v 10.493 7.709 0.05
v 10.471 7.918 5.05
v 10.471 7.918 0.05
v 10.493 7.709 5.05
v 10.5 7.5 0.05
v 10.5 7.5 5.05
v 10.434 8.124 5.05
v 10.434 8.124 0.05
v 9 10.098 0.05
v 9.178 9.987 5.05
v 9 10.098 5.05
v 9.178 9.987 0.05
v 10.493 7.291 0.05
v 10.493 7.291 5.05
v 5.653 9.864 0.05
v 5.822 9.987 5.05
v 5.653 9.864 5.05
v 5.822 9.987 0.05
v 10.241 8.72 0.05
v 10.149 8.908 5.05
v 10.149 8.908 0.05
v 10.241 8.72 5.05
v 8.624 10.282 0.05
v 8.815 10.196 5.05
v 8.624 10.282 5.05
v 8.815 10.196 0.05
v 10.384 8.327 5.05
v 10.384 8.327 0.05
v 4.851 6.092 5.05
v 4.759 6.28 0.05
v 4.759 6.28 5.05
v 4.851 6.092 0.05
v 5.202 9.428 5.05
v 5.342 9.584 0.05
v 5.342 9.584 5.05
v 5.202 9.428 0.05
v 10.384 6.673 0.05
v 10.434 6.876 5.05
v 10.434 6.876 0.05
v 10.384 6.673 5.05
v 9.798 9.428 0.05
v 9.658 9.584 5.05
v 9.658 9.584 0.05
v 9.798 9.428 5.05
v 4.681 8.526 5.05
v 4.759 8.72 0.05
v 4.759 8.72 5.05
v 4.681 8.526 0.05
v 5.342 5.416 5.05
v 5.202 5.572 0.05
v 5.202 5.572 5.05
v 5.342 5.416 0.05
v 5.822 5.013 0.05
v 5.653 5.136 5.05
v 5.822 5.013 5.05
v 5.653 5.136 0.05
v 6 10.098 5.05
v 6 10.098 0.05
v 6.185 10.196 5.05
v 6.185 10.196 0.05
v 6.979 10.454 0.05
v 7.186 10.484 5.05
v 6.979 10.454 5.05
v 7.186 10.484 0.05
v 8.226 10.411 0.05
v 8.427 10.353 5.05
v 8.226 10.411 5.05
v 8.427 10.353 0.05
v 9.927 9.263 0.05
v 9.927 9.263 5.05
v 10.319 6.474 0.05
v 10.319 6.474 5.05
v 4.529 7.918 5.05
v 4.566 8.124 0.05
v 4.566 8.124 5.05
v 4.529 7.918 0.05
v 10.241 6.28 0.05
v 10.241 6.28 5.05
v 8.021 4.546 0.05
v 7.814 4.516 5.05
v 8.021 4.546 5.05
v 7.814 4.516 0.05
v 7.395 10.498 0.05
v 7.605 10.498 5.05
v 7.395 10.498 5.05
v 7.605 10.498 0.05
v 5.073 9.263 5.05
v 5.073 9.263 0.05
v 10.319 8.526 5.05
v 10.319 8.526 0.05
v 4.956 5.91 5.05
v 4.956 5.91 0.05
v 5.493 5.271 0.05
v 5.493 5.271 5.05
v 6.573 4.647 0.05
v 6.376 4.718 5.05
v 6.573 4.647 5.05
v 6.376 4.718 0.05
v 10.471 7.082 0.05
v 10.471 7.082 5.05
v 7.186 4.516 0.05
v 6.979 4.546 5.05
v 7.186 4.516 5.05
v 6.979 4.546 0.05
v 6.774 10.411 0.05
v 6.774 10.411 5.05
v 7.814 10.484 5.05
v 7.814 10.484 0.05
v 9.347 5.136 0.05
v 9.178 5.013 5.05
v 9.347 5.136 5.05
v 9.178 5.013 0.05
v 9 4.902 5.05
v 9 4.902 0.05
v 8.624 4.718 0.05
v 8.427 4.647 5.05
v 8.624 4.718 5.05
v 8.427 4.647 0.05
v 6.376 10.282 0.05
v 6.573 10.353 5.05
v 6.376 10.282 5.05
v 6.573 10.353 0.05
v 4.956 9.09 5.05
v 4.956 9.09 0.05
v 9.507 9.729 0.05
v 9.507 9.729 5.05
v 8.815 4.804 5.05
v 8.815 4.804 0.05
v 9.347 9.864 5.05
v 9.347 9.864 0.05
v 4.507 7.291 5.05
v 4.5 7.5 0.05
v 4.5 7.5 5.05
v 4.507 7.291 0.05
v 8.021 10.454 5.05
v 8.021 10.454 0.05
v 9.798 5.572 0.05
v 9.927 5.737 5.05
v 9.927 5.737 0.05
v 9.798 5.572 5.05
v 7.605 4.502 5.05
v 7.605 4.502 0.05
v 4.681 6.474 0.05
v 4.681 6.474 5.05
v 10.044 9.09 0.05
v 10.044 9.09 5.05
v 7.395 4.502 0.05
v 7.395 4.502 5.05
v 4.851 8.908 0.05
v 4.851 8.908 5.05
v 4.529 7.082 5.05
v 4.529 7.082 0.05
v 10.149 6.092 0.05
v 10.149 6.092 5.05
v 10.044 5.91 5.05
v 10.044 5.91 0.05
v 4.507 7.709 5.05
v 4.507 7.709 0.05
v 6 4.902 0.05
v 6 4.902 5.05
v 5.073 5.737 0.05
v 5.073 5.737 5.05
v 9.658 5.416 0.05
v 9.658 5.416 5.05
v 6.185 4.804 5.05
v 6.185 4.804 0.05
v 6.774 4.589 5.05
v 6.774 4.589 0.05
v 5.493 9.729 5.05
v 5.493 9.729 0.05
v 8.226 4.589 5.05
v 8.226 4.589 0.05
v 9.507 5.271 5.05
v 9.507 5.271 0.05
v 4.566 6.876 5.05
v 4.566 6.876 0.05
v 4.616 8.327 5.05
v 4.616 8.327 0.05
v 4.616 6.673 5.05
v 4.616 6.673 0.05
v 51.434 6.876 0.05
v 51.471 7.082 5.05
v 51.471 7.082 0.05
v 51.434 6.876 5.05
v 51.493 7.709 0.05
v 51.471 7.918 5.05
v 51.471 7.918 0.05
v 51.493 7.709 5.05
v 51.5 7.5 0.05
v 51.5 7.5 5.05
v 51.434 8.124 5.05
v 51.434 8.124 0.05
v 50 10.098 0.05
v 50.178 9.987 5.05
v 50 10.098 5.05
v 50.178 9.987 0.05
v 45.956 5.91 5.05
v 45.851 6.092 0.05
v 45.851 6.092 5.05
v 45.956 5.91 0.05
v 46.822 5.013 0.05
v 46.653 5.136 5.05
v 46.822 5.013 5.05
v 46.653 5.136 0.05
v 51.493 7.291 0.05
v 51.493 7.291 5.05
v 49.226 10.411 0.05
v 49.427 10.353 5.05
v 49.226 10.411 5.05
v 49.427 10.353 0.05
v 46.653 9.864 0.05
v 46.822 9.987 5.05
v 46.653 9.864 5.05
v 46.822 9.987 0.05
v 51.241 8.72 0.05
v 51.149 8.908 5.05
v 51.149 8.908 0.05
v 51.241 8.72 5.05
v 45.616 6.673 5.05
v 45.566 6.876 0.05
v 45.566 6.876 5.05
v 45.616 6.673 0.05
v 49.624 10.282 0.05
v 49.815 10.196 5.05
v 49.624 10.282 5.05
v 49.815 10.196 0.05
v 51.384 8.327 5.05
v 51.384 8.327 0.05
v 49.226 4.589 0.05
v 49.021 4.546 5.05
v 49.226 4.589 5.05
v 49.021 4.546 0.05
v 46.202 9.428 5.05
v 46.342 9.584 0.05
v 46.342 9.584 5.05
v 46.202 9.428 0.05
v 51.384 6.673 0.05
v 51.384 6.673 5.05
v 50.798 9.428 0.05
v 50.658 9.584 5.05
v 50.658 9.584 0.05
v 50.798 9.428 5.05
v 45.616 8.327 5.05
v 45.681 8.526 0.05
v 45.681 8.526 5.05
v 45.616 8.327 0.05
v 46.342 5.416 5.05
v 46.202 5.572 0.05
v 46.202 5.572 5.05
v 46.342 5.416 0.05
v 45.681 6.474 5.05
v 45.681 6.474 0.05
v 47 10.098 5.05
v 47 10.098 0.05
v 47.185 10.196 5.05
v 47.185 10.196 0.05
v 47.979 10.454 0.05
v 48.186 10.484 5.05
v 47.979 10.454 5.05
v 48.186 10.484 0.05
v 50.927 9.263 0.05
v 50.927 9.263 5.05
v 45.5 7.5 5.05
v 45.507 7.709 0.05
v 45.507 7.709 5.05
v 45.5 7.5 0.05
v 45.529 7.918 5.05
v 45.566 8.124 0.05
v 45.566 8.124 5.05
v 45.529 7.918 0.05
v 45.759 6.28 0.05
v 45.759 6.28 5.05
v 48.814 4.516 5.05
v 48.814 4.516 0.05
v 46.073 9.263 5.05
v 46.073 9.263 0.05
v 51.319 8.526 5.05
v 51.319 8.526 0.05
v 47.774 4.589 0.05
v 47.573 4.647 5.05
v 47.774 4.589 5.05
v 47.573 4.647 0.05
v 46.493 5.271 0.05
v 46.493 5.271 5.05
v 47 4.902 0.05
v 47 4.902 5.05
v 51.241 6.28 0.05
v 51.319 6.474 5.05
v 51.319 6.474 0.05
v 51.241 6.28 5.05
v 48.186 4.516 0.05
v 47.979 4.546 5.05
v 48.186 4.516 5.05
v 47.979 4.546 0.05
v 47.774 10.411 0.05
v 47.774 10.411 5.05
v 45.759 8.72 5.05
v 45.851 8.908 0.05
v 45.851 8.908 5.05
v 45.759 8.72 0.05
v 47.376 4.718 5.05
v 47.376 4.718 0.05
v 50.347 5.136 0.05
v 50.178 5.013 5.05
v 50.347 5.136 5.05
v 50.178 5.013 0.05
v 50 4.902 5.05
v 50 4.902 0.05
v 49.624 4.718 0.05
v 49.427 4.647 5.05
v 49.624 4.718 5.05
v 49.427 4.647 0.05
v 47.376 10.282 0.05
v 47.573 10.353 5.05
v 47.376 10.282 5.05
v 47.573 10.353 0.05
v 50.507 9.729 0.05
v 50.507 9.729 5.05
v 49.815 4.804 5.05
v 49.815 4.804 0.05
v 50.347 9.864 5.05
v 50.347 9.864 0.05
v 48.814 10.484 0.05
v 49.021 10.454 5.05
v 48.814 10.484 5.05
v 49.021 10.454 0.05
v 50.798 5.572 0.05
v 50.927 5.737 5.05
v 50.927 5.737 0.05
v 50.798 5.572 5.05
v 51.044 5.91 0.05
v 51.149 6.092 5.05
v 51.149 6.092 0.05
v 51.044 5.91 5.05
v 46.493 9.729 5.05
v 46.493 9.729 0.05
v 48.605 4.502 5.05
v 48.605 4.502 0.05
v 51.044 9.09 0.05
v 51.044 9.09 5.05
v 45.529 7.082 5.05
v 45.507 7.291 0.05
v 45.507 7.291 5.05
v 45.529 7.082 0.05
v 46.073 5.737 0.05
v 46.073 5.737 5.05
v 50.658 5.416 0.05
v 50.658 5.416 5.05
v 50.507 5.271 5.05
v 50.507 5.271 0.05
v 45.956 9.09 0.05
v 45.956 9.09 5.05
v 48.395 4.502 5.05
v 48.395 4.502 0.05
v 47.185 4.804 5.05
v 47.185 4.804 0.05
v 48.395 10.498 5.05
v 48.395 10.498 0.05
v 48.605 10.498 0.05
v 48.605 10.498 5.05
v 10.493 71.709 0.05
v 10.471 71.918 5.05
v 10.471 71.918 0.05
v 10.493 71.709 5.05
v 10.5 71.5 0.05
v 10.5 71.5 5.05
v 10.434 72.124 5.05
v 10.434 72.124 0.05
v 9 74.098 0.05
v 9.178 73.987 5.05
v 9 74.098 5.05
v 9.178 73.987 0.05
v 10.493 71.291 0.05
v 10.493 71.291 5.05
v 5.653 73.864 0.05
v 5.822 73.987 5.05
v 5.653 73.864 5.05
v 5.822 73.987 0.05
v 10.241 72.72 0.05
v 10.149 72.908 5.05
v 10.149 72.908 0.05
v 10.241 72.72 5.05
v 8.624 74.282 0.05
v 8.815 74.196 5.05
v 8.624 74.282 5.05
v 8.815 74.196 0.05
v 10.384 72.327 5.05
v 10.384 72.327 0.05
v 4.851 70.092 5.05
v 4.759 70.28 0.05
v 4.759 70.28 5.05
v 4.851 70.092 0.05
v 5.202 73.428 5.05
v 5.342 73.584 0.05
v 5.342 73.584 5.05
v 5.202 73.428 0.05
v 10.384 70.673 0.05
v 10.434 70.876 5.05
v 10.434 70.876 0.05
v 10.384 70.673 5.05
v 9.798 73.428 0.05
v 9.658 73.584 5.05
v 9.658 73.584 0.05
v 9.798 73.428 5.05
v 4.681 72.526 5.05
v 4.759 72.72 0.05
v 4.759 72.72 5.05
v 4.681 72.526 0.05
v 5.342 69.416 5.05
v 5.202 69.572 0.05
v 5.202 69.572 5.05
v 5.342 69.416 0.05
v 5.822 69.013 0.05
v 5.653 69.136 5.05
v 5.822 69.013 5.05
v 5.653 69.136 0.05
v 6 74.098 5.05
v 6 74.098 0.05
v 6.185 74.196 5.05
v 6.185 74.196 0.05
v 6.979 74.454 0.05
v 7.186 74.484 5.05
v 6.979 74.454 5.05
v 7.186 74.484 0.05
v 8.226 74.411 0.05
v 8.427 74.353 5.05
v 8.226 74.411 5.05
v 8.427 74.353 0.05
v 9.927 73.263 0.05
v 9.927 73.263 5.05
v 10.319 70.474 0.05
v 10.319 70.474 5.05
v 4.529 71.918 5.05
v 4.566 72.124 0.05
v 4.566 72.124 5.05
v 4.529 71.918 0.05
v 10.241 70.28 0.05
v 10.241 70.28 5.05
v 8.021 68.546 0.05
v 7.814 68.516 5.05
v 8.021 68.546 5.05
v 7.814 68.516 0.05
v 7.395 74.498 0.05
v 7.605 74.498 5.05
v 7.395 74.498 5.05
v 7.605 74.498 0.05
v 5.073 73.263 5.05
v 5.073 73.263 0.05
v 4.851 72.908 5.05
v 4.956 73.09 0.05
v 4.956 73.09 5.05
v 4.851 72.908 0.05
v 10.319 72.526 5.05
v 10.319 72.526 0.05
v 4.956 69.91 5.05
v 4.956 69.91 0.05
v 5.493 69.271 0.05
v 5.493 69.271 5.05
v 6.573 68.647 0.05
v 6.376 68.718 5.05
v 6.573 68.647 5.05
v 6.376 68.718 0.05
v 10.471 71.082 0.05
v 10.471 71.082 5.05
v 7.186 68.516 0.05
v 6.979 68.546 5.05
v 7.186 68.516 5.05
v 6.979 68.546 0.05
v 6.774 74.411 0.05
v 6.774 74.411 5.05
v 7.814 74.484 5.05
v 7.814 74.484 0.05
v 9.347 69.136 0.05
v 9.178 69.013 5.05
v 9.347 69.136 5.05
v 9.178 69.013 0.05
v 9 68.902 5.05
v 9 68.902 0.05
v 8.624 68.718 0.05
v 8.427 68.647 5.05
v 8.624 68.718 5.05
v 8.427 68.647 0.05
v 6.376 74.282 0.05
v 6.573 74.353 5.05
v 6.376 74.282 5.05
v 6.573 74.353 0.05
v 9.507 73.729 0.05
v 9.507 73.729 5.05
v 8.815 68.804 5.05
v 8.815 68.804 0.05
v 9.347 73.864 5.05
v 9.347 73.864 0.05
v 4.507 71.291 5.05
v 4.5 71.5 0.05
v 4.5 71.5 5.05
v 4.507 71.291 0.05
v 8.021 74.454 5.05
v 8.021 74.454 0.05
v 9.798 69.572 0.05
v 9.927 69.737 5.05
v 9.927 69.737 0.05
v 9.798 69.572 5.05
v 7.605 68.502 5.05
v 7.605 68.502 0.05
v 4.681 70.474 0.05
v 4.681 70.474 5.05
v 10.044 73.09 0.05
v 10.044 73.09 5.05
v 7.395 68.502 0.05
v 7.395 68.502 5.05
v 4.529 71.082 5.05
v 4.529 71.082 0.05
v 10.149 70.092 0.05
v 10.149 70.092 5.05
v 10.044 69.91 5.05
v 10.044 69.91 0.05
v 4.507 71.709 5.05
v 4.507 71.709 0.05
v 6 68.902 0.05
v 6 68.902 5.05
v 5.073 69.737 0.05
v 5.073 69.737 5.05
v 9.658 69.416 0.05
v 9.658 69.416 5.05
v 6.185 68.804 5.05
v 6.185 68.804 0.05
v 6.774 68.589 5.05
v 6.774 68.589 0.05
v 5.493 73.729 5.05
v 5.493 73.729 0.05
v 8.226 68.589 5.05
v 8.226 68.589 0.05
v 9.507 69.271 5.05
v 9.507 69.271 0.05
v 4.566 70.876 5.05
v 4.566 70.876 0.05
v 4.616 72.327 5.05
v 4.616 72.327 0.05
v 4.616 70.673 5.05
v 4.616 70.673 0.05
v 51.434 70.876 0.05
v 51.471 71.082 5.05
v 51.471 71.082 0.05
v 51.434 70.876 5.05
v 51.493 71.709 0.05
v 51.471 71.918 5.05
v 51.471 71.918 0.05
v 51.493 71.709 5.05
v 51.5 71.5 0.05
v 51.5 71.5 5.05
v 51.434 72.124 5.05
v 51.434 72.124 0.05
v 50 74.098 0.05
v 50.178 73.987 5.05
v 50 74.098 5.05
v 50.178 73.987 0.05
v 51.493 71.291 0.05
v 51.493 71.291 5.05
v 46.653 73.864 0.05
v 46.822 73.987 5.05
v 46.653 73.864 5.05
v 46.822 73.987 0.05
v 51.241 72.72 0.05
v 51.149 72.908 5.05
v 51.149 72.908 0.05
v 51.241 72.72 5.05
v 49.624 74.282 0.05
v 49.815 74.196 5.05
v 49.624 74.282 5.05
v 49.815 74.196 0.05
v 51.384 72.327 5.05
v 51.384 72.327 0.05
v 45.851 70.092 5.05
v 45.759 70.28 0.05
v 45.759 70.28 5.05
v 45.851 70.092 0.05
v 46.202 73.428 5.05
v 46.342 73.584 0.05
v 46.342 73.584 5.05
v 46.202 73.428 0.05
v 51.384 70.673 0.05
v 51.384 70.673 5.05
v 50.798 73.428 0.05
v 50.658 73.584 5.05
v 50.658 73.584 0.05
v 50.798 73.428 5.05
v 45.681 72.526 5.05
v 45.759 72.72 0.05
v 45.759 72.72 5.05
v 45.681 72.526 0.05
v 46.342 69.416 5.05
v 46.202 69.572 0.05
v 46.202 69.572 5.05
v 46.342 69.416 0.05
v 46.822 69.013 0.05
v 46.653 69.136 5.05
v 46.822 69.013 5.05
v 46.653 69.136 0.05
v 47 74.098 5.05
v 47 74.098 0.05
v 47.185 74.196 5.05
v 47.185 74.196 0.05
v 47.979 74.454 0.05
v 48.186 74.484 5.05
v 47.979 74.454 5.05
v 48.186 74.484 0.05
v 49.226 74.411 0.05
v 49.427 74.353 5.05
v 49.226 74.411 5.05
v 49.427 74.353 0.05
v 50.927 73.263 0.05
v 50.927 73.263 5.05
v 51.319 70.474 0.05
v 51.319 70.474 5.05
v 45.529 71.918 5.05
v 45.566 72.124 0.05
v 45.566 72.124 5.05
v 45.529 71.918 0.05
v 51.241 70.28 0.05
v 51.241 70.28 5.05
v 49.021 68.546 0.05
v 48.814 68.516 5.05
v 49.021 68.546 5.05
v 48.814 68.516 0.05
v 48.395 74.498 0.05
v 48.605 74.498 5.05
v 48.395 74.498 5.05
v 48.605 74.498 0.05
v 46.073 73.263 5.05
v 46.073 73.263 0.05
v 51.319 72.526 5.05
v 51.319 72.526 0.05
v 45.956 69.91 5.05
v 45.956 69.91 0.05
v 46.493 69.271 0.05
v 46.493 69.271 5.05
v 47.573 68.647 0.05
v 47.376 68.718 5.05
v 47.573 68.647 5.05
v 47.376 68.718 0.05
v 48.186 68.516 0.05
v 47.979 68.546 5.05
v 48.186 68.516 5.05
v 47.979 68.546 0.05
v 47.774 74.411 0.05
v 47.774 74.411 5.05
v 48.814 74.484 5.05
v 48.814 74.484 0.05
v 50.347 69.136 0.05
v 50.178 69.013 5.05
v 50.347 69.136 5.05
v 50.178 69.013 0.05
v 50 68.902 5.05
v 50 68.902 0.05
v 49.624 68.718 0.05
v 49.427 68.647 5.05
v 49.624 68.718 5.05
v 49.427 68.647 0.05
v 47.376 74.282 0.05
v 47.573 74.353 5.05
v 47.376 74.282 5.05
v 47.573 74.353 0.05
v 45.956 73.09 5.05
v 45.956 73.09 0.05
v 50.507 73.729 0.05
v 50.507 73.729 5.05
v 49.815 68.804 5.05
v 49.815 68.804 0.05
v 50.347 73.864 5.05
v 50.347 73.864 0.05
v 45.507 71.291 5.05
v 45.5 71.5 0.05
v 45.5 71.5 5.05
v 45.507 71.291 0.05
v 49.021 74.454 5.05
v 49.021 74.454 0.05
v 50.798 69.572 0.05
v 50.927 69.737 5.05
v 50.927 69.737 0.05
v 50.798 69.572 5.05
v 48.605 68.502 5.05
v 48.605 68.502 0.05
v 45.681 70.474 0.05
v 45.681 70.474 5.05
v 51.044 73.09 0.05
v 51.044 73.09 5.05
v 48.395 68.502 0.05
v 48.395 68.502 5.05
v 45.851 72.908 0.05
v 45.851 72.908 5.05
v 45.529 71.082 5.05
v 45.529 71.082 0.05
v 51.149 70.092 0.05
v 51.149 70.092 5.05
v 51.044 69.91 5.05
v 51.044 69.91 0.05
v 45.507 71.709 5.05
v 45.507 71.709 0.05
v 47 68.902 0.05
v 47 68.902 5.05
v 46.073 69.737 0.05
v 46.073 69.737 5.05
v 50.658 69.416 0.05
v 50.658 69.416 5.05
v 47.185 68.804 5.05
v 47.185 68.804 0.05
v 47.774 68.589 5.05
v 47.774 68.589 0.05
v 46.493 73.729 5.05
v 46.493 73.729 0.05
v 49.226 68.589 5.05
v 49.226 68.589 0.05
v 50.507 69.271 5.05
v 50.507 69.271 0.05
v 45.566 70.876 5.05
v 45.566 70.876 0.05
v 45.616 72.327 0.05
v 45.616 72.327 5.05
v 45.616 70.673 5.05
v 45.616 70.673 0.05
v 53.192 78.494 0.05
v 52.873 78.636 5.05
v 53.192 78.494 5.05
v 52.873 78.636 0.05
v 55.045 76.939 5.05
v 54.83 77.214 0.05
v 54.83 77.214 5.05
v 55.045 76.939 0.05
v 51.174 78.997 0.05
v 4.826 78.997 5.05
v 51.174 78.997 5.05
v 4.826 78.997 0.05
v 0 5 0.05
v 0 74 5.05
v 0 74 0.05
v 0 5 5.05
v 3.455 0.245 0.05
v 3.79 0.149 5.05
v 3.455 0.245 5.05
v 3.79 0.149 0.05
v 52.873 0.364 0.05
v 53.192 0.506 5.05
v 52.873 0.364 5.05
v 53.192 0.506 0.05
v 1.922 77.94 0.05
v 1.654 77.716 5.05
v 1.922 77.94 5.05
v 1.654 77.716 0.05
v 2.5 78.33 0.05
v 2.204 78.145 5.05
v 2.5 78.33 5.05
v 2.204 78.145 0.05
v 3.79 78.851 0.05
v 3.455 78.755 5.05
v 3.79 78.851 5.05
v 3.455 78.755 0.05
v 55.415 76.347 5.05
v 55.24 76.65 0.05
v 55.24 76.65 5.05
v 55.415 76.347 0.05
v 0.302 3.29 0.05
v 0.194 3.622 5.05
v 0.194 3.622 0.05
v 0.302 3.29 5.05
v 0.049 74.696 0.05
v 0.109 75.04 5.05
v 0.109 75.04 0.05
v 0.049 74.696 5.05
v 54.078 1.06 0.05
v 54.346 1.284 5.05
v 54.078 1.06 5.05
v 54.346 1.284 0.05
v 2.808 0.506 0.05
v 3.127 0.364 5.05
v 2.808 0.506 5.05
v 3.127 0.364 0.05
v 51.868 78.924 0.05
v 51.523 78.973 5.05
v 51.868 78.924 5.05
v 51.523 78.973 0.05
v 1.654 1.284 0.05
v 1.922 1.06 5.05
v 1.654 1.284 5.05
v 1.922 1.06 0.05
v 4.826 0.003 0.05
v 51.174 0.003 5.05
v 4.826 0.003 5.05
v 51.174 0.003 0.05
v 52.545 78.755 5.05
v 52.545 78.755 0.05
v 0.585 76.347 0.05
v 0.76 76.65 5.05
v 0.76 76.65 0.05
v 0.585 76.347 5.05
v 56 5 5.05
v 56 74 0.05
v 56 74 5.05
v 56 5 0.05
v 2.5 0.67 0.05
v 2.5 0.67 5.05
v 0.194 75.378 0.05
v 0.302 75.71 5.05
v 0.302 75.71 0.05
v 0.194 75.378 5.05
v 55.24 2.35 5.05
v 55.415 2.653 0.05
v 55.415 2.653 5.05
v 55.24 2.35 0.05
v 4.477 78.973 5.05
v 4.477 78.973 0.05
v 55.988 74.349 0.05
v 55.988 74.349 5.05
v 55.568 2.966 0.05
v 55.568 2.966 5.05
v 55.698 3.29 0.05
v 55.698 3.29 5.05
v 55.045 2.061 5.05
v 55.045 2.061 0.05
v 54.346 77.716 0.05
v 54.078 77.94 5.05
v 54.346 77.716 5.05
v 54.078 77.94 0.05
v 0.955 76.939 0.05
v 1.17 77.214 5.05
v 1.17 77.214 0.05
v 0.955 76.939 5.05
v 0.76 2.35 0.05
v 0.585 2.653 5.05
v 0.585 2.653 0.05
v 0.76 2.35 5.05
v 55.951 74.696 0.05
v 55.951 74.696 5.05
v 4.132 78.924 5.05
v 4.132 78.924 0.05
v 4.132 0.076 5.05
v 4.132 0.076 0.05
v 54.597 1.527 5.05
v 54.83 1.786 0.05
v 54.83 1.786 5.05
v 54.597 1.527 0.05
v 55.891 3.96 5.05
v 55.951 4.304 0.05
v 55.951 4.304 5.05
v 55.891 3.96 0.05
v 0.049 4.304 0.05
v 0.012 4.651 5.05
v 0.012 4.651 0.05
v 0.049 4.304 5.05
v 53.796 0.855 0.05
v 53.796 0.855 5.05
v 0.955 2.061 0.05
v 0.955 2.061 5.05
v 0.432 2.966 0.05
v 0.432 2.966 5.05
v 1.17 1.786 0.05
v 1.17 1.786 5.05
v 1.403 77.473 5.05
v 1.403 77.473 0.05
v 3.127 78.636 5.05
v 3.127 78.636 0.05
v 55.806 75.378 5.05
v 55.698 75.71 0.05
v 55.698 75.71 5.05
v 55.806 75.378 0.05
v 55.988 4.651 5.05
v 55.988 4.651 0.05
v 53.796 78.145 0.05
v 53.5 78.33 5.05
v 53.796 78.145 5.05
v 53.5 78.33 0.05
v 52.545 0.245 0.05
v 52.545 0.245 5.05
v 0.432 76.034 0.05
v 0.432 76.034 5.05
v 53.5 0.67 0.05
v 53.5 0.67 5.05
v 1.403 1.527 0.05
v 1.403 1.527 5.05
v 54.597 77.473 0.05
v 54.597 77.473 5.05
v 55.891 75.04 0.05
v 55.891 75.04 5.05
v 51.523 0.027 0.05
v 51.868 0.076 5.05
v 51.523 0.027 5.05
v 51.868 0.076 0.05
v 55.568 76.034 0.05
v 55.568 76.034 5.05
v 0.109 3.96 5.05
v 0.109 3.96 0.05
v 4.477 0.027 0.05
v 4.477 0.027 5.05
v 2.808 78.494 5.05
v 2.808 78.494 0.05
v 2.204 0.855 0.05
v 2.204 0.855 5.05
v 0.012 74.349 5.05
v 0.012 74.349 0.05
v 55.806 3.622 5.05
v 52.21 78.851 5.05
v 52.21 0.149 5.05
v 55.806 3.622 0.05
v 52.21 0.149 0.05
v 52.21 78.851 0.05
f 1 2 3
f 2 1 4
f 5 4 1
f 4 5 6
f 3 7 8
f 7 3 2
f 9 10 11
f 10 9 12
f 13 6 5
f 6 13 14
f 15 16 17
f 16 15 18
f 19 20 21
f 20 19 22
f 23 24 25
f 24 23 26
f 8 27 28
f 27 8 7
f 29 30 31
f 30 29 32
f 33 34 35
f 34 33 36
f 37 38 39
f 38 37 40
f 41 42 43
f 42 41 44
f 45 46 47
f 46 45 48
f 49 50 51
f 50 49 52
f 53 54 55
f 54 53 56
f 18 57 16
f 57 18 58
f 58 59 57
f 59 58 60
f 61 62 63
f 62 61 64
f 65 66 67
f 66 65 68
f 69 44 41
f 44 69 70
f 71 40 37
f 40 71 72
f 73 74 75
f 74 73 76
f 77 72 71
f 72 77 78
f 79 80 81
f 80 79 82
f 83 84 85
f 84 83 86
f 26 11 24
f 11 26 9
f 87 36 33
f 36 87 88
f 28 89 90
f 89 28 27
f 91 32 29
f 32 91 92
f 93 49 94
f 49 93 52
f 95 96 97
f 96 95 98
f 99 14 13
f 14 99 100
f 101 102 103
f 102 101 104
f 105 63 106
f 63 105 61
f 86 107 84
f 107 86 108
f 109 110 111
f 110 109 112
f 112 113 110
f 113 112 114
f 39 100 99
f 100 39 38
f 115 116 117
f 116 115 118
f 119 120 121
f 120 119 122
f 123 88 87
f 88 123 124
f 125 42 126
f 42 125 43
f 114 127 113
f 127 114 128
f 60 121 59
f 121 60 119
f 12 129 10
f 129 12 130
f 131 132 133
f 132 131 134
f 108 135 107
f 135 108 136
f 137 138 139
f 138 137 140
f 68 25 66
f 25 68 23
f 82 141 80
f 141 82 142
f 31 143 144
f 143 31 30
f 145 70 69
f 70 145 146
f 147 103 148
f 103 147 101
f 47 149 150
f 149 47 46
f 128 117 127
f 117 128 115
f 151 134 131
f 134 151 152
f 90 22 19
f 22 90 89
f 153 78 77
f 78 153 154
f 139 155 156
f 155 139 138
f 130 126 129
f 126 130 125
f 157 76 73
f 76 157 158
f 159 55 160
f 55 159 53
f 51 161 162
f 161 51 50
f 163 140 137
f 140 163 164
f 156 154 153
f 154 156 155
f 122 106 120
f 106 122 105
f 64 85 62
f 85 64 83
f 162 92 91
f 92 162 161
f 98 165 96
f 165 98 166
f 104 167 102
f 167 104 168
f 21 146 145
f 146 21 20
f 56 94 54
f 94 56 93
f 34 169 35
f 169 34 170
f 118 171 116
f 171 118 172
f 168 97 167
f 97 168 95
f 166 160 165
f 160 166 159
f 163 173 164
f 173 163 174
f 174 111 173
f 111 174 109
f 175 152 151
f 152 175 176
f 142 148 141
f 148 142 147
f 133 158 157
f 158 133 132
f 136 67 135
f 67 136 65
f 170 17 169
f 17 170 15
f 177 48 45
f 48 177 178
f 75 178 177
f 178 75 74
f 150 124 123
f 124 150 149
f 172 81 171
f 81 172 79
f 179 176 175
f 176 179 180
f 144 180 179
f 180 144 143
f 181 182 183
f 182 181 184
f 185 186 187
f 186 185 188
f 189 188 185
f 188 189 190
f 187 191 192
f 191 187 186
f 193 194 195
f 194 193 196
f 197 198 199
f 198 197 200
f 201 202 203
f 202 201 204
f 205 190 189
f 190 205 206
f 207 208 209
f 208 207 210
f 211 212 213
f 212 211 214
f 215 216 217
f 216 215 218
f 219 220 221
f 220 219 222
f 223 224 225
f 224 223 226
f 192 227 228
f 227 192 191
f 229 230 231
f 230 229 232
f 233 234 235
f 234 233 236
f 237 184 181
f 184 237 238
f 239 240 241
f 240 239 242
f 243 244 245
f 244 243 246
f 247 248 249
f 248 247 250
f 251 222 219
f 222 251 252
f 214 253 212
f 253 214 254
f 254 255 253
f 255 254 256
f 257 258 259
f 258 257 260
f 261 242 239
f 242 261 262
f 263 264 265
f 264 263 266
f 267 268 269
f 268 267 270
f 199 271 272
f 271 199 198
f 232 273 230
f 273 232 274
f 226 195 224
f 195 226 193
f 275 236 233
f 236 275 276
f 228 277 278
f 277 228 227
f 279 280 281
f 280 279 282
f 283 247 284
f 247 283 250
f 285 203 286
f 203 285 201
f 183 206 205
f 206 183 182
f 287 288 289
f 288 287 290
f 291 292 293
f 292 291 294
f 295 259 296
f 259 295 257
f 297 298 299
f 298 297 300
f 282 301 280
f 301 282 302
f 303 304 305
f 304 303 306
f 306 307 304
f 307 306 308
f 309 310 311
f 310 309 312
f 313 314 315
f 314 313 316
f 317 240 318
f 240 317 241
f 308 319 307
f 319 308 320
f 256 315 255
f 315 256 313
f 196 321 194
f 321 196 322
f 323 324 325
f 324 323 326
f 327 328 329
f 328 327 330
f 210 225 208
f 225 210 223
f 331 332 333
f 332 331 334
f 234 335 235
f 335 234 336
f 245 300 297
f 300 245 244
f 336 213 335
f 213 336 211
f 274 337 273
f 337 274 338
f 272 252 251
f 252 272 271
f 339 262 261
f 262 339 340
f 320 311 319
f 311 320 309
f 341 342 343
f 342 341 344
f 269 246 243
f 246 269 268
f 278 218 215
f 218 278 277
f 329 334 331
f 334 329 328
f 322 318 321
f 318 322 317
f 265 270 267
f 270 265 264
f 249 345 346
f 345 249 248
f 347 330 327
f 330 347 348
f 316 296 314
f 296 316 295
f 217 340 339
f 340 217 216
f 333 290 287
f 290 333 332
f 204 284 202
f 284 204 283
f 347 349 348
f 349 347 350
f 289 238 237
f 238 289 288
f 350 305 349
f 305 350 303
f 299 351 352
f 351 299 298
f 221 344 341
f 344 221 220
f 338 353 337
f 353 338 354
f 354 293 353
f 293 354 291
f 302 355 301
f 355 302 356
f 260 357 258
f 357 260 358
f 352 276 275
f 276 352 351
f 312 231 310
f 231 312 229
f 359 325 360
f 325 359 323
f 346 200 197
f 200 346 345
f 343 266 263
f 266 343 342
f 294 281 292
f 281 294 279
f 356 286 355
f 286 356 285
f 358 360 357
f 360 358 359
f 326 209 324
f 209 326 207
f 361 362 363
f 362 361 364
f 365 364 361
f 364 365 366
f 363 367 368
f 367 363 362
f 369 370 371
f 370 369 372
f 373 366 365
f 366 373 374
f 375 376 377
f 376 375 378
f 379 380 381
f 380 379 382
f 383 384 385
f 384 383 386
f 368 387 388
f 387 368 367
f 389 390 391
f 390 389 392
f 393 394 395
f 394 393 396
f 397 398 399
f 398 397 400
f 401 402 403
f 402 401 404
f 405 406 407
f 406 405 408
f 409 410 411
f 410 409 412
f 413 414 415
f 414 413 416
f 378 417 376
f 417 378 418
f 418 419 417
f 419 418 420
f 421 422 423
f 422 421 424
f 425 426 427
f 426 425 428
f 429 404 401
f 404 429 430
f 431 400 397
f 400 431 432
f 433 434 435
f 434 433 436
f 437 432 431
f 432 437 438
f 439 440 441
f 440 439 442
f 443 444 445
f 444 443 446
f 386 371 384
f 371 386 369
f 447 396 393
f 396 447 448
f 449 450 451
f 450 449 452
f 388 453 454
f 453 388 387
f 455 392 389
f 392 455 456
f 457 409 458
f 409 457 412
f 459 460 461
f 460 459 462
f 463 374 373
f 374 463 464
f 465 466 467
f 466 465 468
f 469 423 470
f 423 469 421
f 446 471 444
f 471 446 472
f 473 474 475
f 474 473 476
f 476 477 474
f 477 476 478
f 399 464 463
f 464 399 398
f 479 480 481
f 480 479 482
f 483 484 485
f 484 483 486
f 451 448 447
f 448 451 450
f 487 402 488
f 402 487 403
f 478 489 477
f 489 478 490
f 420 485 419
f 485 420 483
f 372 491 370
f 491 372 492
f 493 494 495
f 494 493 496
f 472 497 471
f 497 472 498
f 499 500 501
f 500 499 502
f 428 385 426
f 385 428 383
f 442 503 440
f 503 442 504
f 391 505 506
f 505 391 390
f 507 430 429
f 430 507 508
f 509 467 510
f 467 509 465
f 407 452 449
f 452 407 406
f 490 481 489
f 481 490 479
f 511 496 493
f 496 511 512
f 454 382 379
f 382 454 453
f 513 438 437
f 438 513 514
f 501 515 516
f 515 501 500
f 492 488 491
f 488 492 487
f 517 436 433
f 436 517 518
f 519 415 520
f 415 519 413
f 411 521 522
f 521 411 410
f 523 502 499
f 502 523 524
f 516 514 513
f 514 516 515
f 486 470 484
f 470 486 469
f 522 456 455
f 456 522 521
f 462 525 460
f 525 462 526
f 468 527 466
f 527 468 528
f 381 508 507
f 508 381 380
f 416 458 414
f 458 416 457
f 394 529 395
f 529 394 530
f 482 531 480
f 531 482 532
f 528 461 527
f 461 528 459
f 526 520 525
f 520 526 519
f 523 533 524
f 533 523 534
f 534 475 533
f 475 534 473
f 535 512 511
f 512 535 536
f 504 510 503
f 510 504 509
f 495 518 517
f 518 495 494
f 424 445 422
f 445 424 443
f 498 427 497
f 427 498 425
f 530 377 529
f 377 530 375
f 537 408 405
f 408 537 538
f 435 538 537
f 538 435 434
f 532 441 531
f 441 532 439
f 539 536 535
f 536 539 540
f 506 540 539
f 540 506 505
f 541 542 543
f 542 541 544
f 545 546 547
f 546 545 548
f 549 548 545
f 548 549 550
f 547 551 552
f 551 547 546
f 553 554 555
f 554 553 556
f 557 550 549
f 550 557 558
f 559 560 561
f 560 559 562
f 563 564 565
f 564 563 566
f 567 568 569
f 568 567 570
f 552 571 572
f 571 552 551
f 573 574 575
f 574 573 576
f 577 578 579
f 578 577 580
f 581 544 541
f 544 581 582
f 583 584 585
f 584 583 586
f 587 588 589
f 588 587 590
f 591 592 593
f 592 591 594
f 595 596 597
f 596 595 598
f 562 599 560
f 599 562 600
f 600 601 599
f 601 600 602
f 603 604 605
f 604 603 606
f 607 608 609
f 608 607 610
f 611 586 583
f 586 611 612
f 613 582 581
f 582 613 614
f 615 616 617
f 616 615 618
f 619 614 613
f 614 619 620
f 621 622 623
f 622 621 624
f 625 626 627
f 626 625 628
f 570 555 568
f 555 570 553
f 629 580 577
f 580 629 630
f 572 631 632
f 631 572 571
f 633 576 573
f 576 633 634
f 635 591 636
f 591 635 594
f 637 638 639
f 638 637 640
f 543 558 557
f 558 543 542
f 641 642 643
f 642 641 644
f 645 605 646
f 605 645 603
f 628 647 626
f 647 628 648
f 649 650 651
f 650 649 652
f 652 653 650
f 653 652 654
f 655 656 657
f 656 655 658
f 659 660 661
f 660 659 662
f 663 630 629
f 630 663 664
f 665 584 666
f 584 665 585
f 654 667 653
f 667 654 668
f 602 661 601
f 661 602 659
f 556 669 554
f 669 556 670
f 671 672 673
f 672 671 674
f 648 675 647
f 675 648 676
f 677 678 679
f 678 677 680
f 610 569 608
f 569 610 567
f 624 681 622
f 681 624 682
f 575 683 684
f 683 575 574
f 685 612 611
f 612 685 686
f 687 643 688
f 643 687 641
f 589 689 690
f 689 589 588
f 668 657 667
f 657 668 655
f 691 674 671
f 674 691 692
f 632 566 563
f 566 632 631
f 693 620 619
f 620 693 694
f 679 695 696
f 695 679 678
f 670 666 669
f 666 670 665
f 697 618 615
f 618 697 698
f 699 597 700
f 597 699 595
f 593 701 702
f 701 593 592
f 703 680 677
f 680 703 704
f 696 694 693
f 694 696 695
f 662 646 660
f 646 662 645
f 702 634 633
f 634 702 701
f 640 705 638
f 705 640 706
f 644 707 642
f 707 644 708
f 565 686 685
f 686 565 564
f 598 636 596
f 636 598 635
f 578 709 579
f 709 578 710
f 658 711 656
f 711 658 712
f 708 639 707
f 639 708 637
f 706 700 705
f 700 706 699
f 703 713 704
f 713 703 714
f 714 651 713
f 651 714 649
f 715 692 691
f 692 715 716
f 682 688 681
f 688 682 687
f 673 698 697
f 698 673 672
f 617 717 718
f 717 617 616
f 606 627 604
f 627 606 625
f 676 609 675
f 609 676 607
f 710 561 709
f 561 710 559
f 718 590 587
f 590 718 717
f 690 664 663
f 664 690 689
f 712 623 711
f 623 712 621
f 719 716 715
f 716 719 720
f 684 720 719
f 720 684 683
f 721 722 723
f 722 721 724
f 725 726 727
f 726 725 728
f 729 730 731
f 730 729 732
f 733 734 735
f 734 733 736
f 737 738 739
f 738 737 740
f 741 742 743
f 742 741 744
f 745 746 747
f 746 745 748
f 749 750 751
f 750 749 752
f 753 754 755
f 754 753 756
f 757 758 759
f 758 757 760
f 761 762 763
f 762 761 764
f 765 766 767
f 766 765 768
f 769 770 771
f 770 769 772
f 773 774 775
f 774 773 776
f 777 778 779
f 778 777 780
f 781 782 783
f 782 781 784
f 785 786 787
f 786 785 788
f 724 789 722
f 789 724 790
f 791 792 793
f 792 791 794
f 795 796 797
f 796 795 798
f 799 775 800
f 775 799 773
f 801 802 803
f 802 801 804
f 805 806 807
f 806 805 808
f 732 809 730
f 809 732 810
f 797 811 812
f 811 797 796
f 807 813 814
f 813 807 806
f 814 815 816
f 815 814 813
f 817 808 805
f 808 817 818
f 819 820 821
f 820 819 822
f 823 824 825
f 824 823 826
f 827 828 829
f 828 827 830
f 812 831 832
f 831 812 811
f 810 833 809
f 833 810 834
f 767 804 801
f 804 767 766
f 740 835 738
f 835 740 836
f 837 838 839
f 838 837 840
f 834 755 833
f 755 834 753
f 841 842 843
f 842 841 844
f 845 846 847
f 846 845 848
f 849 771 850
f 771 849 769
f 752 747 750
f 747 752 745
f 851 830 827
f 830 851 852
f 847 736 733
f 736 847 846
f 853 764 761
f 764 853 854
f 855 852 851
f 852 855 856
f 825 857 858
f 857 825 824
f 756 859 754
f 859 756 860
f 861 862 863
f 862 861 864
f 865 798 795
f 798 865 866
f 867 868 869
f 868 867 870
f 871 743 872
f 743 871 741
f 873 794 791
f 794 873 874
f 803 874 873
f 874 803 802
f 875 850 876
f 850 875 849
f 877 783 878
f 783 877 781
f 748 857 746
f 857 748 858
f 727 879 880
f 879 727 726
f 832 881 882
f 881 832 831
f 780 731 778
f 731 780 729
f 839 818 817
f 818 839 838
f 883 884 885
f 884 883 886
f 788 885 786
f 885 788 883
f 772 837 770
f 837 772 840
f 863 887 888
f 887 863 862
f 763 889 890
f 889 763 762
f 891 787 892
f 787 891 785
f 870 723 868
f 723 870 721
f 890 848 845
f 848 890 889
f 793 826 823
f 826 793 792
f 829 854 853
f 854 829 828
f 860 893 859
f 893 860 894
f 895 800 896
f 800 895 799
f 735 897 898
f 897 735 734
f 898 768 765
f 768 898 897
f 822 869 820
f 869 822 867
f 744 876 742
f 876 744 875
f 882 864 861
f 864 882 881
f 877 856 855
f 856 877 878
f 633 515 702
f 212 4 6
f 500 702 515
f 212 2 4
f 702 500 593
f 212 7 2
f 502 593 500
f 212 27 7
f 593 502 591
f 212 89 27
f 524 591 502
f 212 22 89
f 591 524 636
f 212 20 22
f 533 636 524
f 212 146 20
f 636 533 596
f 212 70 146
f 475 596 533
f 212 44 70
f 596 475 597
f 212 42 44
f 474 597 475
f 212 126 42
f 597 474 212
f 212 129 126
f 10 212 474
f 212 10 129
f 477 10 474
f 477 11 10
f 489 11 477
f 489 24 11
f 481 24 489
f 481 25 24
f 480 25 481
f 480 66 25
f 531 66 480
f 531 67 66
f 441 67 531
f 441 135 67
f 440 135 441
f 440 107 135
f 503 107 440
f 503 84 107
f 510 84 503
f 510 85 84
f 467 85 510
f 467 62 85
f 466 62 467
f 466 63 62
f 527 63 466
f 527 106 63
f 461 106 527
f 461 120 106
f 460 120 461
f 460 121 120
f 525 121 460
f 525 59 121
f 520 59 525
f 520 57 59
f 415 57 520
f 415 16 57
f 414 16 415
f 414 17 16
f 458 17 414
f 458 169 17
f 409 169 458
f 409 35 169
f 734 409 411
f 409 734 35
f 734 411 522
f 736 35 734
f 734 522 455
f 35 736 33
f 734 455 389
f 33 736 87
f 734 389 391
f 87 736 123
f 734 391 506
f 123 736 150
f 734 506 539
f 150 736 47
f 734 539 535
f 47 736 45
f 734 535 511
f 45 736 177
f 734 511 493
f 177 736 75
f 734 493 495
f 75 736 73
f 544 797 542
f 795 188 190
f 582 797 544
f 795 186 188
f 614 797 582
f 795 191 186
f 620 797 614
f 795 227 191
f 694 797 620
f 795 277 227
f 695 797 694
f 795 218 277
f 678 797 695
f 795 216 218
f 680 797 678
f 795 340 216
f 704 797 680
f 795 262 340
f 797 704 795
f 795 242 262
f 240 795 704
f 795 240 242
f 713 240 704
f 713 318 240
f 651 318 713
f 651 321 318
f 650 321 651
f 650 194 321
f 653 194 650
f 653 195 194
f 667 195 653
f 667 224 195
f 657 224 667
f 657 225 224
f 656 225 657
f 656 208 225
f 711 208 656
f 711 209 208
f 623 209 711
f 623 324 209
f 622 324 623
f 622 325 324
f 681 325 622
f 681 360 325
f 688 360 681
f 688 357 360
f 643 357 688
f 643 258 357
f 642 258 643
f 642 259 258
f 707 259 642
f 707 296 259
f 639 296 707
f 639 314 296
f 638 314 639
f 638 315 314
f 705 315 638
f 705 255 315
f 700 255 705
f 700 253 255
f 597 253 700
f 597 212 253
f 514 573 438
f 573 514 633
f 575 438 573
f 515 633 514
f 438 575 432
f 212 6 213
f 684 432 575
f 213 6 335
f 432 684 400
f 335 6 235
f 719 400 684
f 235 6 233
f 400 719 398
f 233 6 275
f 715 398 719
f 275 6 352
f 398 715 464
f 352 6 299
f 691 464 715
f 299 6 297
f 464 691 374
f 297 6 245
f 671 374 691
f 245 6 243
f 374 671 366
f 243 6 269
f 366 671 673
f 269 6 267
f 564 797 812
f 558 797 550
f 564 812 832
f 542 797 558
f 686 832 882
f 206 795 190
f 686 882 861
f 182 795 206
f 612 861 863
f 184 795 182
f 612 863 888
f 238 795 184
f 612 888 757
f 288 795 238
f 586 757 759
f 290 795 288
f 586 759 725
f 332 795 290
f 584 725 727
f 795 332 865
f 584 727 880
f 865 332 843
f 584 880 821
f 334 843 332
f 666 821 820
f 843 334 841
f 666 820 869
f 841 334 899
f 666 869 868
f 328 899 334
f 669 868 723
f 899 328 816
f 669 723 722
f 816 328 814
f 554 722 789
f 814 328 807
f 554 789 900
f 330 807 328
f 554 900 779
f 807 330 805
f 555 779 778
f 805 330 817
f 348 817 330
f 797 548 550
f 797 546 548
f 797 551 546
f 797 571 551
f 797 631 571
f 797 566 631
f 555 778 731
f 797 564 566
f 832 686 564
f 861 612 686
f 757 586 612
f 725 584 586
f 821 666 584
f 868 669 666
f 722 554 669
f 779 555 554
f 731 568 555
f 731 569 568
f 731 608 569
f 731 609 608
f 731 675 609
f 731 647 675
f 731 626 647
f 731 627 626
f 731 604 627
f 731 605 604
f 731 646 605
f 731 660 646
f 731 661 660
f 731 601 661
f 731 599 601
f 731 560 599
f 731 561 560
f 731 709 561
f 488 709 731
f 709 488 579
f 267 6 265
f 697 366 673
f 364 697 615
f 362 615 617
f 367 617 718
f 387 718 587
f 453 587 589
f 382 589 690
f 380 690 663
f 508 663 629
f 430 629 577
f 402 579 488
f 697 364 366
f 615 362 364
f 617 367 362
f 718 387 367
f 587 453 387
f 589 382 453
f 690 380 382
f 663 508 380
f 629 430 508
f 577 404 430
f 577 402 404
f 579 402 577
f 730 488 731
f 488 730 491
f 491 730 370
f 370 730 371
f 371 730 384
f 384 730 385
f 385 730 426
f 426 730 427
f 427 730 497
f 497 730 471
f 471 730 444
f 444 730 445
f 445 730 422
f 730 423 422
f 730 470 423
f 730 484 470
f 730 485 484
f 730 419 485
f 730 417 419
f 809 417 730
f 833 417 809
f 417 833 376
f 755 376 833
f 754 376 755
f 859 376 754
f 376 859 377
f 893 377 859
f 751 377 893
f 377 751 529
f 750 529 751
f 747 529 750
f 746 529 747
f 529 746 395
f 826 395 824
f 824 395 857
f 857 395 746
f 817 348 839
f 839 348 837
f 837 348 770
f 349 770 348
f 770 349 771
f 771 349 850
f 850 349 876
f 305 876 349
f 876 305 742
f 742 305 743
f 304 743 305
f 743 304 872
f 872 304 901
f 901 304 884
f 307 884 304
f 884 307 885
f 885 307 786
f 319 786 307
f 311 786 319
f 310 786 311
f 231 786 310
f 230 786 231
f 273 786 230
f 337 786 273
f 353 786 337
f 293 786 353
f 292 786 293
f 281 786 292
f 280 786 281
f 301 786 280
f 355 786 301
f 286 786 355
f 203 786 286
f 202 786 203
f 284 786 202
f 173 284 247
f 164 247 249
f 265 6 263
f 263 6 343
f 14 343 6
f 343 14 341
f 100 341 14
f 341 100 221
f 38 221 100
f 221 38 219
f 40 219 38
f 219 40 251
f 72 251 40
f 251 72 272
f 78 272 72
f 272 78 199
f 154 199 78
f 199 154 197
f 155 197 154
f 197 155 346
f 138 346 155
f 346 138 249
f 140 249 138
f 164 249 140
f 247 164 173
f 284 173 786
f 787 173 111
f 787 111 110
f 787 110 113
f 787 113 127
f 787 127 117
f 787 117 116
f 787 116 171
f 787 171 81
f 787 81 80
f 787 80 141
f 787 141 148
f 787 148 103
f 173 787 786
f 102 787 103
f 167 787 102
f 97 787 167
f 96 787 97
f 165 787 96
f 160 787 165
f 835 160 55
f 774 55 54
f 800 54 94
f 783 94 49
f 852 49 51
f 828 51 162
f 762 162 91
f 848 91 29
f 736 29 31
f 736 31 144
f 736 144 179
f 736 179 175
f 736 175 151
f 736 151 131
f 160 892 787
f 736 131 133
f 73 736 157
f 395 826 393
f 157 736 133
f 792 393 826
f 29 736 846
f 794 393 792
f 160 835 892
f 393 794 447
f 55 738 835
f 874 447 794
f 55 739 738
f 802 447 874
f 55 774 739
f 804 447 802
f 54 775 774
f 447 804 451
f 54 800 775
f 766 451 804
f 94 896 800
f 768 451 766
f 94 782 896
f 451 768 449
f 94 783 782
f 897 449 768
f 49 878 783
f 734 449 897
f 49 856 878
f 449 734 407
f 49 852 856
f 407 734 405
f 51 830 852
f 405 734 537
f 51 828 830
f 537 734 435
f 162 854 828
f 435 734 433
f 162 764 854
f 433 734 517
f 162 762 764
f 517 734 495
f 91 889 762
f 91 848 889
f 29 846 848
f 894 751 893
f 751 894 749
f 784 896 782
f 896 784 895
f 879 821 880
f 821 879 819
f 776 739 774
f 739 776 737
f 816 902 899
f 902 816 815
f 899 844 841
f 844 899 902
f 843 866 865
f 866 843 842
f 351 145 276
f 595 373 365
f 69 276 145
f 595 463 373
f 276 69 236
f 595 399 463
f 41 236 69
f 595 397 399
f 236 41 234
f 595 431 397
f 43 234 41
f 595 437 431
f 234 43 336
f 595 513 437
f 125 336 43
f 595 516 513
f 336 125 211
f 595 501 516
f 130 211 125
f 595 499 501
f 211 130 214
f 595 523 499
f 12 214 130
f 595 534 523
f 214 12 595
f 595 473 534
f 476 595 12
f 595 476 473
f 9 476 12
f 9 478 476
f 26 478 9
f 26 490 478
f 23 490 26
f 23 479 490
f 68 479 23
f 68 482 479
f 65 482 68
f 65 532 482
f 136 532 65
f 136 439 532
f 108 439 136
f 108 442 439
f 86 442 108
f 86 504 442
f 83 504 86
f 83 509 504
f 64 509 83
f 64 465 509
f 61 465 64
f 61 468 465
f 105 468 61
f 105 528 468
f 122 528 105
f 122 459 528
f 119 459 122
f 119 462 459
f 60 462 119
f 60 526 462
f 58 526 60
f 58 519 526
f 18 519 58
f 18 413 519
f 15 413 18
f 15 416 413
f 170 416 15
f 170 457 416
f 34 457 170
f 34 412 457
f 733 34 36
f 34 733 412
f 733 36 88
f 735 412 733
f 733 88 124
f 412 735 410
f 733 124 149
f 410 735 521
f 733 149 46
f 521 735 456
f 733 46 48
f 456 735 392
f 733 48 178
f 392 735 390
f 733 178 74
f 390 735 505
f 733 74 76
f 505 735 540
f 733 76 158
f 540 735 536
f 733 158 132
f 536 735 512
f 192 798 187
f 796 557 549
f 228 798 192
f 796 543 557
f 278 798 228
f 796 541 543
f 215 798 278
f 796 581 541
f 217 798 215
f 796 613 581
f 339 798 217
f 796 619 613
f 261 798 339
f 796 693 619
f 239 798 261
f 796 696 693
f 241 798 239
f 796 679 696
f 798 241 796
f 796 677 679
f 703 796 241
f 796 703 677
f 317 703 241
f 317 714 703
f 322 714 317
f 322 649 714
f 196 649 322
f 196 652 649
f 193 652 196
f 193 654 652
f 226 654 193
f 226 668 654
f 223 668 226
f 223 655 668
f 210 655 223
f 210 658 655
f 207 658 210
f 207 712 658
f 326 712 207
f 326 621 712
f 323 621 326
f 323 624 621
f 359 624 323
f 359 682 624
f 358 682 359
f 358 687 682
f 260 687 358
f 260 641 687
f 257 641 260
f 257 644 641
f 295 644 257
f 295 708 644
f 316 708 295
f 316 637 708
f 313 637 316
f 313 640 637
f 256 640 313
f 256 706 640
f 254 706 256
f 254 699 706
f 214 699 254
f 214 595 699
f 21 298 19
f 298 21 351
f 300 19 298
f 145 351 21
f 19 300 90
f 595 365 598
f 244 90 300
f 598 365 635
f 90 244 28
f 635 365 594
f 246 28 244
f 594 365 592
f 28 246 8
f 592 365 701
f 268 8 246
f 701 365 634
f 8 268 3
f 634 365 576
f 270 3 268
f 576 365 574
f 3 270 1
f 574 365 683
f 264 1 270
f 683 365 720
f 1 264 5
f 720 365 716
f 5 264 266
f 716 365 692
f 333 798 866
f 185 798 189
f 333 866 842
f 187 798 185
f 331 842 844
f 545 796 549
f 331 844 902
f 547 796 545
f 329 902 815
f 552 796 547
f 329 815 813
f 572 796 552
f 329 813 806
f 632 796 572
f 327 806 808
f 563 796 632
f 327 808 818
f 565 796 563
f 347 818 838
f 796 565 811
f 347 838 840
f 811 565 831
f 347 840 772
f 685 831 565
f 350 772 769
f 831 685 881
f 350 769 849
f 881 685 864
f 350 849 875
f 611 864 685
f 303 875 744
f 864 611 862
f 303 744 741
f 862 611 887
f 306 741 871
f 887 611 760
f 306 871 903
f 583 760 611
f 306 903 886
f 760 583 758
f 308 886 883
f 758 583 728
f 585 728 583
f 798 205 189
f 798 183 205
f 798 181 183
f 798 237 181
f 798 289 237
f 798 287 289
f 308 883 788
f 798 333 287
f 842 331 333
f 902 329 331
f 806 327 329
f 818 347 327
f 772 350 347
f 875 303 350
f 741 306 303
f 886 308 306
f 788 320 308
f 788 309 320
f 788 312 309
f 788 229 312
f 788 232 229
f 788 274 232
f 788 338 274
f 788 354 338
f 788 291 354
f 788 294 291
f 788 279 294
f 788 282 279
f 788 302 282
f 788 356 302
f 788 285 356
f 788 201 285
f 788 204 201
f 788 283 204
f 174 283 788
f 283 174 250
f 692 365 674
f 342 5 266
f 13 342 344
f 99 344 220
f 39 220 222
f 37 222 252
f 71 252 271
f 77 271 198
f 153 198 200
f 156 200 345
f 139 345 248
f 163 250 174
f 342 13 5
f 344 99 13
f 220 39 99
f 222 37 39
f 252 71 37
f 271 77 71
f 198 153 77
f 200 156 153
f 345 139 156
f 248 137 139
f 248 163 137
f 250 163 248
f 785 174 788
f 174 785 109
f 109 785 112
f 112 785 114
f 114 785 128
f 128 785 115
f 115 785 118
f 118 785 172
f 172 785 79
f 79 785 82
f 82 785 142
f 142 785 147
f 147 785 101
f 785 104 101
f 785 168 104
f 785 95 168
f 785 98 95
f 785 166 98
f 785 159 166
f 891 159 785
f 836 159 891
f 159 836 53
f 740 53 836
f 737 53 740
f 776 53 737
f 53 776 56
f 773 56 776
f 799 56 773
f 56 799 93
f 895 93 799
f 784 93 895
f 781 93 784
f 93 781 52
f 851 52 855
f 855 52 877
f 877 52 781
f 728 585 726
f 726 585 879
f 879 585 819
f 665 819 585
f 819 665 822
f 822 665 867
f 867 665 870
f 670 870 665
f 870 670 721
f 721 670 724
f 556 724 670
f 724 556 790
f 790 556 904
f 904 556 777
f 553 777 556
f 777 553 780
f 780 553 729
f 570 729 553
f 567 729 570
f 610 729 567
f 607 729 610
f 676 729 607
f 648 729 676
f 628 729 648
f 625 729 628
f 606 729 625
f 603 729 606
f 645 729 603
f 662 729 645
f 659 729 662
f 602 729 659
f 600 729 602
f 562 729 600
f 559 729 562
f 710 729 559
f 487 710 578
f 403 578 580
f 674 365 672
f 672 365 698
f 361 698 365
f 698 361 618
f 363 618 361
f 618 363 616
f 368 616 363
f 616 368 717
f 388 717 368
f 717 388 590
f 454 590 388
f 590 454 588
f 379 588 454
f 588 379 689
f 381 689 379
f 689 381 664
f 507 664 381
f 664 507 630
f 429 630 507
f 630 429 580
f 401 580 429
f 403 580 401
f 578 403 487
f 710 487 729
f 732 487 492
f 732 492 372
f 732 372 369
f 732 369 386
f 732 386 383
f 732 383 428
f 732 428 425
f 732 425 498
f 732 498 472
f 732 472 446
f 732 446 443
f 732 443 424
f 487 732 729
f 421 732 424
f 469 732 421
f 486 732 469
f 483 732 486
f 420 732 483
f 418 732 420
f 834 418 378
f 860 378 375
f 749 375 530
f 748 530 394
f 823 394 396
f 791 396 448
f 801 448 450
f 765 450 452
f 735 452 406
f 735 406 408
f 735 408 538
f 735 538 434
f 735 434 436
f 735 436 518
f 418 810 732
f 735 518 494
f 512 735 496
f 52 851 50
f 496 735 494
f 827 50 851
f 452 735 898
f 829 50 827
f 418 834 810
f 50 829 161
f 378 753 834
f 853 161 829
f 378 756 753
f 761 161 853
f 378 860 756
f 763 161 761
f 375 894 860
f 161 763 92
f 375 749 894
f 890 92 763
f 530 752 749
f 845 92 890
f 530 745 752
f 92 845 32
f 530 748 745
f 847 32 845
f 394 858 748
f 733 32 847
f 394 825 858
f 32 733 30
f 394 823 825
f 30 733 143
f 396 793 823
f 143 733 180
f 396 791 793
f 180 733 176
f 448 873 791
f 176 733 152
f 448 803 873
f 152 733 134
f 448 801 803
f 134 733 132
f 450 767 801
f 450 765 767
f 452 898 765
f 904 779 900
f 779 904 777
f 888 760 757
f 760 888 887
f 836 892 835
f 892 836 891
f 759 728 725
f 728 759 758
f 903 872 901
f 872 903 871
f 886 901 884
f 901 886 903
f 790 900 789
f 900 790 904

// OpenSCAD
$fn=90;
pad=0.1;
pad_x=56;
pad_y=79;
pad_z=5;
r=5;
d=r*2;

inner_pad=[pad_x-d,pad_y-d,pad_z-pad];
screw=6;
screw_x=41;
screw_y=64;

module screw(x,y) {
    translate([x+(pad_x-screw_x)/2,y+(pad_y-screw_y)/2,-pad])
    cylinder(d=screw,h=pad_z+pad*2);
}

module y_screws(y) {
    screw(0,y);
    screw(screw_x,y);
}

module screws() {
    y_screws(0);
    y_screws(screw_y);
}

module pad() {
    translate([r,r,pad/2])
    minkowski() {
        cube(inner_pad);
        cylinder(d=d,h=pad);
    }
}

difference() {
    pad();
    screws();
}
